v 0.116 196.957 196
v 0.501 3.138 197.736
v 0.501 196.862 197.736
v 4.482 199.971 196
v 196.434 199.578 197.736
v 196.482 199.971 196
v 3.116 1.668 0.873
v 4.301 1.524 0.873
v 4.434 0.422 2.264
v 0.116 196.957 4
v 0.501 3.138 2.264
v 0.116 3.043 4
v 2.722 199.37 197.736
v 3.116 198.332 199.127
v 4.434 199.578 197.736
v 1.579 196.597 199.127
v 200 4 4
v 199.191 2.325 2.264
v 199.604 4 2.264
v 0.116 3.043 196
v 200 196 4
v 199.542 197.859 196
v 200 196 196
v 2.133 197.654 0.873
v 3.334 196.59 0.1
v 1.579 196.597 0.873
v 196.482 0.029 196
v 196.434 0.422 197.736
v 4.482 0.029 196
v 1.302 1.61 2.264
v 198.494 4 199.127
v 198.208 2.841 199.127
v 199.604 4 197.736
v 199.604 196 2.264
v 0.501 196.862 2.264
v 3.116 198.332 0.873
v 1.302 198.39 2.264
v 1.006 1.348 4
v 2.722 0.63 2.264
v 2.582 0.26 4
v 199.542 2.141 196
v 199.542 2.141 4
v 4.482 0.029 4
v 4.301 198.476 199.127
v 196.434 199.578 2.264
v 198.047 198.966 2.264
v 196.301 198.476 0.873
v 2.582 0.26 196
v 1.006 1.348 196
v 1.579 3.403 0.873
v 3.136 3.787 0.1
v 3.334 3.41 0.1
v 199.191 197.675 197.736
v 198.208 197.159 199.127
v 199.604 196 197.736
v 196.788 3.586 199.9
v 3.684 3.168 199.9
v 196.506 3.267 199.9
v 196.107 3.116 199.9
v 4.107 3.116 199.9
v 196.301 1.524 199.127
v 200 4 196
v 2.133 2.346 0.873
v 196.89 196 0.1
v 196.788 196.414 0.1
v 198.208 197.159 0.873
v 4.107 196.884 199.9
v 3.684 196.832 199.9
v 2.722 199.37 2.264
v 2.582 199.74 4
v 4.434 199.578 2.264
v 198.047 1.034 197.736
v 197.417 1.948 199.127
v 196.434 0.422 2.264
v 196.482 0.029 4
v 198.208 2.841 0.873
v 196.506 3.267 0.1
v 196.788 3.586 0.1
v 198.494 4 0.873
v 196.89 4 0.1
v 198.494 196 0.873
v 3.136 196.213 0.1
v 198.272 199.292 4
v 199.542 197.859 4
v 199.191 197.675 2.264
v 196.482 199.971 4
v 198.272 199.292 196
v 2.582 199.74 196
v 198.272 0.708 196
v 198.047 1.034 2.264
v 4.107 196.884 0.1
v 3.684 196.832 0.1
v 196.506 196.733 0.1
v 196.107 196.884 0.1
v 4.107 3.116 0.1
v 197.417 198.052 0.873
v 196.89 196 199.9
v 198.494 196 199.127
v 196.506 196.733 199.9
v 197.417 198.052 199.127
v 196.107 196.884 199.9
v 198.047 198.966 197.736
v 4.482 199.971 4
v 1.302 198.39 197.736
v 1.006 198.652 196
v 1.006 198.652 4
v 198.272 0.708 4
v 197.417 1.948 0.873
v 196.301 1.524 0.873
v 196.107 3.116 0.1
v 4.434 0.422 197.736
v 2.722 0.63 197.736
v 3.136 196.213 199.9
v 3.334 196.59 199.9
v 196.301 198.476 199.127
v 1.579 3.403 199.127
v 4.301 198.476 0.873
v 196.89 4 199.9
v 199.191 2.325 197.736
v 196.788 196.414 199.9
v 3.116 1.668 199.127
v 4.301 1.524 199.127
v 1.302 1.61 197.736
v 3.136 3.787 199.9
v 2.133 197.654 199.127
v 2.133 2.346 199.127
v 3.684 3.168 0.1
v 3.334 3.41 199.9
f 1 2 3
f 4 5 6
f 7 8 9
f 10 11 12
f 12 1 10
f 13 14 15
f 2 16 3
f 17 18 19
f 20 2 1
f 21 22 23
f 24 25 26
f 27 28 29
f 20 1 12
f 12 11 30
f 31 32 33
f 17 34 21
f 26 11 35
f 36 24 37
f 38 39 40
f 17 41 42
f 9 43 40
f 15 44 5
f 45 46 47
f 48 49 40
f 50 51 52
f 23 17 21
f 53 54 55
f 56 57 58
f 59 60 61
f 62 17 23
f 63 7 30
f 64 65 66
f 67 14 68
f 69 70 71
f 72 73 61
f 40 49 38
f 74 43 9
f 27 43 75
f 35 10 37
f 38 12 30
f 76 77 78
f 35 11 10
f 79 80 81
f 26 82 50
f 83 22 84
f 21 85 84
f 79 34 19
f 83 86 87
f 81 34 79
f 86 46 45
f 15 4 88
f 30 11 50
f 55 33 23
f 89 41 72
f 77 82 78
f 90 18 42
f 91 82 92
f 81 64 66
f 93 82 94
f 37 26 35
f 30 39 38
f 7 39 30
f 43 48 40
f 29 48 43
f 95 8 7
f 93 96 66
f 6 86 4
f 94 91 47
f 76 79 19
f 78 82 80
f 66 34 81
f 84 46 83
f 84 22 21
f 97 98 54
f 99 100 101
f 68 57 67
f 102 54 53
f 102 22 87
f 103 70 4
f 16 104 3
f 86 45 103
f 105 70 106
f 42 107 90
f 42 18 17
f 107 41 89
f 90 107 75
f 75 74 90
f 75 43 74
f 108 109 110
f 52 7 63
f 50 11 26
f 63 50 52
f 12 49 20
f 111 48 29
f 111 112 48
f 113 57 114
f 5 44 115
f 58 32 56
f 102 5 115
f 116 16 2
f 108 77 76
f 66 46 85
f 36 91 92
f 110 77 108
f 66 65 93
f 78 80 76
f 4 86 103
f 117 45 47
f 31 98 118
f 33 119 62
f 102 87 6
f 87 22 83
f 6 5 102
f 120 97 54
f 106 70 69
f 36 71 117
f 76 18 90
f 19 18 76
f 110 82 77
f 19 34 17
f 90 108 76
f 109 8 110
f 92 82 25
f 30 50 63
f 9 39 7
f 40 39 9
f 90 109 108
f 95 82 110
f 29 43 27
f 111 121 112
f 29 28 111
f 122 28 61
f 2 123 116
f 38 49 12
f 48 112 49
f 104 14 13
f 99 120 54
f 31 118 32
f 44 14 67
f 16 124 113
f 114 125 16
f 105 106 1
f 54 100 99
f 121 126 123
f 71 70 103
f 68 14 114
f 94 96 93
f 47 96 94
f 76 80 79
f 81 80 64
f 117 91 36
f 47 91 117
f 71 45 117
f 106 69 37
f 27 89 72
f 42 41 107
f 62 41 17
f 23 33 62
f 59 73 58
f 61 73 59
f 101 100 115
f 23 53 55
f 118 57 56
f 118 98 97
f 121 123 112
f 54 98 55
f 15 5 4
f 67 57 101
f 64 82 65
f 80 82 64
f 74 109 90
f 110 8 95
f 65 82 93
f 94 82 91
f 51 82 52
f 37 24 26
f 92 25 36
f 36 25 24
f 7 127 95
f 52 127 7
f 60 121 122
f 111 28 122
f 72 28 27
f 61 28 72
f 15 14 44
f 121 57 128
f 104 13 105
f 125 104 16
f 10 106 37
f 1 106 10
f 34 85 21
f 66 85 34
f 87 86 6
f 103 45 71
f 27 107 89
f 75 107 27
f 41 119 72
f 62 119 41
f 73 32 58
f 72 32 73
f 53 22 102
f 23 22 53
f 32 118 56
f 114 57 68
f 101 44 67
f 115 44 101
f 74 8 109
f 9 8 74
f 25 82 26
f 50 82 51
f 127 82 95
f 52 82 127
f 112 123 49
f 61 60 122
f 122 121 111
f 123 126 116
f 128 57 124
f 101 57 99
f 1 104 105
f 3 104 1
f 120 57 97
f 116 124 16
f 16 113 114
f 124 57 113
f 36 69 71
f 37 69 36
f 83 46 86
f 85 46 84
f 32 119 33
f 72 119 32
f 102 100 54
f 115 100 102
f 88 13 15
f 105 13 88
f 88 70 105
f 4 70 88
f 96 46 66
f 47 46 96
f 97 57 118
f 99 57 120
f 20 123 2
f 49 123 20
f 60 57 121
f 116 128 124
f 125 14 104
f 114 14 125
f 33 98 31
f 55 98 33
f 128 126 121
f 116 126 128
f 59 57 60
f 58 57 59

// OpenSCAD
module cube_round(size, center = false, r=0){
    sx = size[0] - 2 * r;
    sy = size[1] - 2 * r;
    sz = size[2] - 2 * r;
    translate([r, r, r]) hull() {
        for (offset=[[0, 0, 0],
                     [0, 0, sz],
                     [0, sy, sz],
                     [0, sy, 0],
                     [sx, sy, 0],
                     [sx, sy, sz],
                     [sx, 0, sz],
                     [sx, 0, 0]])
        {
            translate(offset) sphere(r);
        }
    }
}

module cube_hole(size, wallWidth, center = false){
    if (!center){
        translate([size[0] / 2, size[1] / 2, size[2] / 2]){
            _cube_hole_centered(size, wallWidth);
        }
    } else {
        _cube_hole_centered(size, wallWidth);
    }
}

module _cube_hole_centered(size, wallWidth){
    iSize = [size[0] - wallWidth * 2, size[1] - wallWidth * 2, size[2] + 1];
    difference(){
        cube(size, center = true);
        cube(iSize, center = true);
    }
}


cube_round([200,200,200], r=4);
